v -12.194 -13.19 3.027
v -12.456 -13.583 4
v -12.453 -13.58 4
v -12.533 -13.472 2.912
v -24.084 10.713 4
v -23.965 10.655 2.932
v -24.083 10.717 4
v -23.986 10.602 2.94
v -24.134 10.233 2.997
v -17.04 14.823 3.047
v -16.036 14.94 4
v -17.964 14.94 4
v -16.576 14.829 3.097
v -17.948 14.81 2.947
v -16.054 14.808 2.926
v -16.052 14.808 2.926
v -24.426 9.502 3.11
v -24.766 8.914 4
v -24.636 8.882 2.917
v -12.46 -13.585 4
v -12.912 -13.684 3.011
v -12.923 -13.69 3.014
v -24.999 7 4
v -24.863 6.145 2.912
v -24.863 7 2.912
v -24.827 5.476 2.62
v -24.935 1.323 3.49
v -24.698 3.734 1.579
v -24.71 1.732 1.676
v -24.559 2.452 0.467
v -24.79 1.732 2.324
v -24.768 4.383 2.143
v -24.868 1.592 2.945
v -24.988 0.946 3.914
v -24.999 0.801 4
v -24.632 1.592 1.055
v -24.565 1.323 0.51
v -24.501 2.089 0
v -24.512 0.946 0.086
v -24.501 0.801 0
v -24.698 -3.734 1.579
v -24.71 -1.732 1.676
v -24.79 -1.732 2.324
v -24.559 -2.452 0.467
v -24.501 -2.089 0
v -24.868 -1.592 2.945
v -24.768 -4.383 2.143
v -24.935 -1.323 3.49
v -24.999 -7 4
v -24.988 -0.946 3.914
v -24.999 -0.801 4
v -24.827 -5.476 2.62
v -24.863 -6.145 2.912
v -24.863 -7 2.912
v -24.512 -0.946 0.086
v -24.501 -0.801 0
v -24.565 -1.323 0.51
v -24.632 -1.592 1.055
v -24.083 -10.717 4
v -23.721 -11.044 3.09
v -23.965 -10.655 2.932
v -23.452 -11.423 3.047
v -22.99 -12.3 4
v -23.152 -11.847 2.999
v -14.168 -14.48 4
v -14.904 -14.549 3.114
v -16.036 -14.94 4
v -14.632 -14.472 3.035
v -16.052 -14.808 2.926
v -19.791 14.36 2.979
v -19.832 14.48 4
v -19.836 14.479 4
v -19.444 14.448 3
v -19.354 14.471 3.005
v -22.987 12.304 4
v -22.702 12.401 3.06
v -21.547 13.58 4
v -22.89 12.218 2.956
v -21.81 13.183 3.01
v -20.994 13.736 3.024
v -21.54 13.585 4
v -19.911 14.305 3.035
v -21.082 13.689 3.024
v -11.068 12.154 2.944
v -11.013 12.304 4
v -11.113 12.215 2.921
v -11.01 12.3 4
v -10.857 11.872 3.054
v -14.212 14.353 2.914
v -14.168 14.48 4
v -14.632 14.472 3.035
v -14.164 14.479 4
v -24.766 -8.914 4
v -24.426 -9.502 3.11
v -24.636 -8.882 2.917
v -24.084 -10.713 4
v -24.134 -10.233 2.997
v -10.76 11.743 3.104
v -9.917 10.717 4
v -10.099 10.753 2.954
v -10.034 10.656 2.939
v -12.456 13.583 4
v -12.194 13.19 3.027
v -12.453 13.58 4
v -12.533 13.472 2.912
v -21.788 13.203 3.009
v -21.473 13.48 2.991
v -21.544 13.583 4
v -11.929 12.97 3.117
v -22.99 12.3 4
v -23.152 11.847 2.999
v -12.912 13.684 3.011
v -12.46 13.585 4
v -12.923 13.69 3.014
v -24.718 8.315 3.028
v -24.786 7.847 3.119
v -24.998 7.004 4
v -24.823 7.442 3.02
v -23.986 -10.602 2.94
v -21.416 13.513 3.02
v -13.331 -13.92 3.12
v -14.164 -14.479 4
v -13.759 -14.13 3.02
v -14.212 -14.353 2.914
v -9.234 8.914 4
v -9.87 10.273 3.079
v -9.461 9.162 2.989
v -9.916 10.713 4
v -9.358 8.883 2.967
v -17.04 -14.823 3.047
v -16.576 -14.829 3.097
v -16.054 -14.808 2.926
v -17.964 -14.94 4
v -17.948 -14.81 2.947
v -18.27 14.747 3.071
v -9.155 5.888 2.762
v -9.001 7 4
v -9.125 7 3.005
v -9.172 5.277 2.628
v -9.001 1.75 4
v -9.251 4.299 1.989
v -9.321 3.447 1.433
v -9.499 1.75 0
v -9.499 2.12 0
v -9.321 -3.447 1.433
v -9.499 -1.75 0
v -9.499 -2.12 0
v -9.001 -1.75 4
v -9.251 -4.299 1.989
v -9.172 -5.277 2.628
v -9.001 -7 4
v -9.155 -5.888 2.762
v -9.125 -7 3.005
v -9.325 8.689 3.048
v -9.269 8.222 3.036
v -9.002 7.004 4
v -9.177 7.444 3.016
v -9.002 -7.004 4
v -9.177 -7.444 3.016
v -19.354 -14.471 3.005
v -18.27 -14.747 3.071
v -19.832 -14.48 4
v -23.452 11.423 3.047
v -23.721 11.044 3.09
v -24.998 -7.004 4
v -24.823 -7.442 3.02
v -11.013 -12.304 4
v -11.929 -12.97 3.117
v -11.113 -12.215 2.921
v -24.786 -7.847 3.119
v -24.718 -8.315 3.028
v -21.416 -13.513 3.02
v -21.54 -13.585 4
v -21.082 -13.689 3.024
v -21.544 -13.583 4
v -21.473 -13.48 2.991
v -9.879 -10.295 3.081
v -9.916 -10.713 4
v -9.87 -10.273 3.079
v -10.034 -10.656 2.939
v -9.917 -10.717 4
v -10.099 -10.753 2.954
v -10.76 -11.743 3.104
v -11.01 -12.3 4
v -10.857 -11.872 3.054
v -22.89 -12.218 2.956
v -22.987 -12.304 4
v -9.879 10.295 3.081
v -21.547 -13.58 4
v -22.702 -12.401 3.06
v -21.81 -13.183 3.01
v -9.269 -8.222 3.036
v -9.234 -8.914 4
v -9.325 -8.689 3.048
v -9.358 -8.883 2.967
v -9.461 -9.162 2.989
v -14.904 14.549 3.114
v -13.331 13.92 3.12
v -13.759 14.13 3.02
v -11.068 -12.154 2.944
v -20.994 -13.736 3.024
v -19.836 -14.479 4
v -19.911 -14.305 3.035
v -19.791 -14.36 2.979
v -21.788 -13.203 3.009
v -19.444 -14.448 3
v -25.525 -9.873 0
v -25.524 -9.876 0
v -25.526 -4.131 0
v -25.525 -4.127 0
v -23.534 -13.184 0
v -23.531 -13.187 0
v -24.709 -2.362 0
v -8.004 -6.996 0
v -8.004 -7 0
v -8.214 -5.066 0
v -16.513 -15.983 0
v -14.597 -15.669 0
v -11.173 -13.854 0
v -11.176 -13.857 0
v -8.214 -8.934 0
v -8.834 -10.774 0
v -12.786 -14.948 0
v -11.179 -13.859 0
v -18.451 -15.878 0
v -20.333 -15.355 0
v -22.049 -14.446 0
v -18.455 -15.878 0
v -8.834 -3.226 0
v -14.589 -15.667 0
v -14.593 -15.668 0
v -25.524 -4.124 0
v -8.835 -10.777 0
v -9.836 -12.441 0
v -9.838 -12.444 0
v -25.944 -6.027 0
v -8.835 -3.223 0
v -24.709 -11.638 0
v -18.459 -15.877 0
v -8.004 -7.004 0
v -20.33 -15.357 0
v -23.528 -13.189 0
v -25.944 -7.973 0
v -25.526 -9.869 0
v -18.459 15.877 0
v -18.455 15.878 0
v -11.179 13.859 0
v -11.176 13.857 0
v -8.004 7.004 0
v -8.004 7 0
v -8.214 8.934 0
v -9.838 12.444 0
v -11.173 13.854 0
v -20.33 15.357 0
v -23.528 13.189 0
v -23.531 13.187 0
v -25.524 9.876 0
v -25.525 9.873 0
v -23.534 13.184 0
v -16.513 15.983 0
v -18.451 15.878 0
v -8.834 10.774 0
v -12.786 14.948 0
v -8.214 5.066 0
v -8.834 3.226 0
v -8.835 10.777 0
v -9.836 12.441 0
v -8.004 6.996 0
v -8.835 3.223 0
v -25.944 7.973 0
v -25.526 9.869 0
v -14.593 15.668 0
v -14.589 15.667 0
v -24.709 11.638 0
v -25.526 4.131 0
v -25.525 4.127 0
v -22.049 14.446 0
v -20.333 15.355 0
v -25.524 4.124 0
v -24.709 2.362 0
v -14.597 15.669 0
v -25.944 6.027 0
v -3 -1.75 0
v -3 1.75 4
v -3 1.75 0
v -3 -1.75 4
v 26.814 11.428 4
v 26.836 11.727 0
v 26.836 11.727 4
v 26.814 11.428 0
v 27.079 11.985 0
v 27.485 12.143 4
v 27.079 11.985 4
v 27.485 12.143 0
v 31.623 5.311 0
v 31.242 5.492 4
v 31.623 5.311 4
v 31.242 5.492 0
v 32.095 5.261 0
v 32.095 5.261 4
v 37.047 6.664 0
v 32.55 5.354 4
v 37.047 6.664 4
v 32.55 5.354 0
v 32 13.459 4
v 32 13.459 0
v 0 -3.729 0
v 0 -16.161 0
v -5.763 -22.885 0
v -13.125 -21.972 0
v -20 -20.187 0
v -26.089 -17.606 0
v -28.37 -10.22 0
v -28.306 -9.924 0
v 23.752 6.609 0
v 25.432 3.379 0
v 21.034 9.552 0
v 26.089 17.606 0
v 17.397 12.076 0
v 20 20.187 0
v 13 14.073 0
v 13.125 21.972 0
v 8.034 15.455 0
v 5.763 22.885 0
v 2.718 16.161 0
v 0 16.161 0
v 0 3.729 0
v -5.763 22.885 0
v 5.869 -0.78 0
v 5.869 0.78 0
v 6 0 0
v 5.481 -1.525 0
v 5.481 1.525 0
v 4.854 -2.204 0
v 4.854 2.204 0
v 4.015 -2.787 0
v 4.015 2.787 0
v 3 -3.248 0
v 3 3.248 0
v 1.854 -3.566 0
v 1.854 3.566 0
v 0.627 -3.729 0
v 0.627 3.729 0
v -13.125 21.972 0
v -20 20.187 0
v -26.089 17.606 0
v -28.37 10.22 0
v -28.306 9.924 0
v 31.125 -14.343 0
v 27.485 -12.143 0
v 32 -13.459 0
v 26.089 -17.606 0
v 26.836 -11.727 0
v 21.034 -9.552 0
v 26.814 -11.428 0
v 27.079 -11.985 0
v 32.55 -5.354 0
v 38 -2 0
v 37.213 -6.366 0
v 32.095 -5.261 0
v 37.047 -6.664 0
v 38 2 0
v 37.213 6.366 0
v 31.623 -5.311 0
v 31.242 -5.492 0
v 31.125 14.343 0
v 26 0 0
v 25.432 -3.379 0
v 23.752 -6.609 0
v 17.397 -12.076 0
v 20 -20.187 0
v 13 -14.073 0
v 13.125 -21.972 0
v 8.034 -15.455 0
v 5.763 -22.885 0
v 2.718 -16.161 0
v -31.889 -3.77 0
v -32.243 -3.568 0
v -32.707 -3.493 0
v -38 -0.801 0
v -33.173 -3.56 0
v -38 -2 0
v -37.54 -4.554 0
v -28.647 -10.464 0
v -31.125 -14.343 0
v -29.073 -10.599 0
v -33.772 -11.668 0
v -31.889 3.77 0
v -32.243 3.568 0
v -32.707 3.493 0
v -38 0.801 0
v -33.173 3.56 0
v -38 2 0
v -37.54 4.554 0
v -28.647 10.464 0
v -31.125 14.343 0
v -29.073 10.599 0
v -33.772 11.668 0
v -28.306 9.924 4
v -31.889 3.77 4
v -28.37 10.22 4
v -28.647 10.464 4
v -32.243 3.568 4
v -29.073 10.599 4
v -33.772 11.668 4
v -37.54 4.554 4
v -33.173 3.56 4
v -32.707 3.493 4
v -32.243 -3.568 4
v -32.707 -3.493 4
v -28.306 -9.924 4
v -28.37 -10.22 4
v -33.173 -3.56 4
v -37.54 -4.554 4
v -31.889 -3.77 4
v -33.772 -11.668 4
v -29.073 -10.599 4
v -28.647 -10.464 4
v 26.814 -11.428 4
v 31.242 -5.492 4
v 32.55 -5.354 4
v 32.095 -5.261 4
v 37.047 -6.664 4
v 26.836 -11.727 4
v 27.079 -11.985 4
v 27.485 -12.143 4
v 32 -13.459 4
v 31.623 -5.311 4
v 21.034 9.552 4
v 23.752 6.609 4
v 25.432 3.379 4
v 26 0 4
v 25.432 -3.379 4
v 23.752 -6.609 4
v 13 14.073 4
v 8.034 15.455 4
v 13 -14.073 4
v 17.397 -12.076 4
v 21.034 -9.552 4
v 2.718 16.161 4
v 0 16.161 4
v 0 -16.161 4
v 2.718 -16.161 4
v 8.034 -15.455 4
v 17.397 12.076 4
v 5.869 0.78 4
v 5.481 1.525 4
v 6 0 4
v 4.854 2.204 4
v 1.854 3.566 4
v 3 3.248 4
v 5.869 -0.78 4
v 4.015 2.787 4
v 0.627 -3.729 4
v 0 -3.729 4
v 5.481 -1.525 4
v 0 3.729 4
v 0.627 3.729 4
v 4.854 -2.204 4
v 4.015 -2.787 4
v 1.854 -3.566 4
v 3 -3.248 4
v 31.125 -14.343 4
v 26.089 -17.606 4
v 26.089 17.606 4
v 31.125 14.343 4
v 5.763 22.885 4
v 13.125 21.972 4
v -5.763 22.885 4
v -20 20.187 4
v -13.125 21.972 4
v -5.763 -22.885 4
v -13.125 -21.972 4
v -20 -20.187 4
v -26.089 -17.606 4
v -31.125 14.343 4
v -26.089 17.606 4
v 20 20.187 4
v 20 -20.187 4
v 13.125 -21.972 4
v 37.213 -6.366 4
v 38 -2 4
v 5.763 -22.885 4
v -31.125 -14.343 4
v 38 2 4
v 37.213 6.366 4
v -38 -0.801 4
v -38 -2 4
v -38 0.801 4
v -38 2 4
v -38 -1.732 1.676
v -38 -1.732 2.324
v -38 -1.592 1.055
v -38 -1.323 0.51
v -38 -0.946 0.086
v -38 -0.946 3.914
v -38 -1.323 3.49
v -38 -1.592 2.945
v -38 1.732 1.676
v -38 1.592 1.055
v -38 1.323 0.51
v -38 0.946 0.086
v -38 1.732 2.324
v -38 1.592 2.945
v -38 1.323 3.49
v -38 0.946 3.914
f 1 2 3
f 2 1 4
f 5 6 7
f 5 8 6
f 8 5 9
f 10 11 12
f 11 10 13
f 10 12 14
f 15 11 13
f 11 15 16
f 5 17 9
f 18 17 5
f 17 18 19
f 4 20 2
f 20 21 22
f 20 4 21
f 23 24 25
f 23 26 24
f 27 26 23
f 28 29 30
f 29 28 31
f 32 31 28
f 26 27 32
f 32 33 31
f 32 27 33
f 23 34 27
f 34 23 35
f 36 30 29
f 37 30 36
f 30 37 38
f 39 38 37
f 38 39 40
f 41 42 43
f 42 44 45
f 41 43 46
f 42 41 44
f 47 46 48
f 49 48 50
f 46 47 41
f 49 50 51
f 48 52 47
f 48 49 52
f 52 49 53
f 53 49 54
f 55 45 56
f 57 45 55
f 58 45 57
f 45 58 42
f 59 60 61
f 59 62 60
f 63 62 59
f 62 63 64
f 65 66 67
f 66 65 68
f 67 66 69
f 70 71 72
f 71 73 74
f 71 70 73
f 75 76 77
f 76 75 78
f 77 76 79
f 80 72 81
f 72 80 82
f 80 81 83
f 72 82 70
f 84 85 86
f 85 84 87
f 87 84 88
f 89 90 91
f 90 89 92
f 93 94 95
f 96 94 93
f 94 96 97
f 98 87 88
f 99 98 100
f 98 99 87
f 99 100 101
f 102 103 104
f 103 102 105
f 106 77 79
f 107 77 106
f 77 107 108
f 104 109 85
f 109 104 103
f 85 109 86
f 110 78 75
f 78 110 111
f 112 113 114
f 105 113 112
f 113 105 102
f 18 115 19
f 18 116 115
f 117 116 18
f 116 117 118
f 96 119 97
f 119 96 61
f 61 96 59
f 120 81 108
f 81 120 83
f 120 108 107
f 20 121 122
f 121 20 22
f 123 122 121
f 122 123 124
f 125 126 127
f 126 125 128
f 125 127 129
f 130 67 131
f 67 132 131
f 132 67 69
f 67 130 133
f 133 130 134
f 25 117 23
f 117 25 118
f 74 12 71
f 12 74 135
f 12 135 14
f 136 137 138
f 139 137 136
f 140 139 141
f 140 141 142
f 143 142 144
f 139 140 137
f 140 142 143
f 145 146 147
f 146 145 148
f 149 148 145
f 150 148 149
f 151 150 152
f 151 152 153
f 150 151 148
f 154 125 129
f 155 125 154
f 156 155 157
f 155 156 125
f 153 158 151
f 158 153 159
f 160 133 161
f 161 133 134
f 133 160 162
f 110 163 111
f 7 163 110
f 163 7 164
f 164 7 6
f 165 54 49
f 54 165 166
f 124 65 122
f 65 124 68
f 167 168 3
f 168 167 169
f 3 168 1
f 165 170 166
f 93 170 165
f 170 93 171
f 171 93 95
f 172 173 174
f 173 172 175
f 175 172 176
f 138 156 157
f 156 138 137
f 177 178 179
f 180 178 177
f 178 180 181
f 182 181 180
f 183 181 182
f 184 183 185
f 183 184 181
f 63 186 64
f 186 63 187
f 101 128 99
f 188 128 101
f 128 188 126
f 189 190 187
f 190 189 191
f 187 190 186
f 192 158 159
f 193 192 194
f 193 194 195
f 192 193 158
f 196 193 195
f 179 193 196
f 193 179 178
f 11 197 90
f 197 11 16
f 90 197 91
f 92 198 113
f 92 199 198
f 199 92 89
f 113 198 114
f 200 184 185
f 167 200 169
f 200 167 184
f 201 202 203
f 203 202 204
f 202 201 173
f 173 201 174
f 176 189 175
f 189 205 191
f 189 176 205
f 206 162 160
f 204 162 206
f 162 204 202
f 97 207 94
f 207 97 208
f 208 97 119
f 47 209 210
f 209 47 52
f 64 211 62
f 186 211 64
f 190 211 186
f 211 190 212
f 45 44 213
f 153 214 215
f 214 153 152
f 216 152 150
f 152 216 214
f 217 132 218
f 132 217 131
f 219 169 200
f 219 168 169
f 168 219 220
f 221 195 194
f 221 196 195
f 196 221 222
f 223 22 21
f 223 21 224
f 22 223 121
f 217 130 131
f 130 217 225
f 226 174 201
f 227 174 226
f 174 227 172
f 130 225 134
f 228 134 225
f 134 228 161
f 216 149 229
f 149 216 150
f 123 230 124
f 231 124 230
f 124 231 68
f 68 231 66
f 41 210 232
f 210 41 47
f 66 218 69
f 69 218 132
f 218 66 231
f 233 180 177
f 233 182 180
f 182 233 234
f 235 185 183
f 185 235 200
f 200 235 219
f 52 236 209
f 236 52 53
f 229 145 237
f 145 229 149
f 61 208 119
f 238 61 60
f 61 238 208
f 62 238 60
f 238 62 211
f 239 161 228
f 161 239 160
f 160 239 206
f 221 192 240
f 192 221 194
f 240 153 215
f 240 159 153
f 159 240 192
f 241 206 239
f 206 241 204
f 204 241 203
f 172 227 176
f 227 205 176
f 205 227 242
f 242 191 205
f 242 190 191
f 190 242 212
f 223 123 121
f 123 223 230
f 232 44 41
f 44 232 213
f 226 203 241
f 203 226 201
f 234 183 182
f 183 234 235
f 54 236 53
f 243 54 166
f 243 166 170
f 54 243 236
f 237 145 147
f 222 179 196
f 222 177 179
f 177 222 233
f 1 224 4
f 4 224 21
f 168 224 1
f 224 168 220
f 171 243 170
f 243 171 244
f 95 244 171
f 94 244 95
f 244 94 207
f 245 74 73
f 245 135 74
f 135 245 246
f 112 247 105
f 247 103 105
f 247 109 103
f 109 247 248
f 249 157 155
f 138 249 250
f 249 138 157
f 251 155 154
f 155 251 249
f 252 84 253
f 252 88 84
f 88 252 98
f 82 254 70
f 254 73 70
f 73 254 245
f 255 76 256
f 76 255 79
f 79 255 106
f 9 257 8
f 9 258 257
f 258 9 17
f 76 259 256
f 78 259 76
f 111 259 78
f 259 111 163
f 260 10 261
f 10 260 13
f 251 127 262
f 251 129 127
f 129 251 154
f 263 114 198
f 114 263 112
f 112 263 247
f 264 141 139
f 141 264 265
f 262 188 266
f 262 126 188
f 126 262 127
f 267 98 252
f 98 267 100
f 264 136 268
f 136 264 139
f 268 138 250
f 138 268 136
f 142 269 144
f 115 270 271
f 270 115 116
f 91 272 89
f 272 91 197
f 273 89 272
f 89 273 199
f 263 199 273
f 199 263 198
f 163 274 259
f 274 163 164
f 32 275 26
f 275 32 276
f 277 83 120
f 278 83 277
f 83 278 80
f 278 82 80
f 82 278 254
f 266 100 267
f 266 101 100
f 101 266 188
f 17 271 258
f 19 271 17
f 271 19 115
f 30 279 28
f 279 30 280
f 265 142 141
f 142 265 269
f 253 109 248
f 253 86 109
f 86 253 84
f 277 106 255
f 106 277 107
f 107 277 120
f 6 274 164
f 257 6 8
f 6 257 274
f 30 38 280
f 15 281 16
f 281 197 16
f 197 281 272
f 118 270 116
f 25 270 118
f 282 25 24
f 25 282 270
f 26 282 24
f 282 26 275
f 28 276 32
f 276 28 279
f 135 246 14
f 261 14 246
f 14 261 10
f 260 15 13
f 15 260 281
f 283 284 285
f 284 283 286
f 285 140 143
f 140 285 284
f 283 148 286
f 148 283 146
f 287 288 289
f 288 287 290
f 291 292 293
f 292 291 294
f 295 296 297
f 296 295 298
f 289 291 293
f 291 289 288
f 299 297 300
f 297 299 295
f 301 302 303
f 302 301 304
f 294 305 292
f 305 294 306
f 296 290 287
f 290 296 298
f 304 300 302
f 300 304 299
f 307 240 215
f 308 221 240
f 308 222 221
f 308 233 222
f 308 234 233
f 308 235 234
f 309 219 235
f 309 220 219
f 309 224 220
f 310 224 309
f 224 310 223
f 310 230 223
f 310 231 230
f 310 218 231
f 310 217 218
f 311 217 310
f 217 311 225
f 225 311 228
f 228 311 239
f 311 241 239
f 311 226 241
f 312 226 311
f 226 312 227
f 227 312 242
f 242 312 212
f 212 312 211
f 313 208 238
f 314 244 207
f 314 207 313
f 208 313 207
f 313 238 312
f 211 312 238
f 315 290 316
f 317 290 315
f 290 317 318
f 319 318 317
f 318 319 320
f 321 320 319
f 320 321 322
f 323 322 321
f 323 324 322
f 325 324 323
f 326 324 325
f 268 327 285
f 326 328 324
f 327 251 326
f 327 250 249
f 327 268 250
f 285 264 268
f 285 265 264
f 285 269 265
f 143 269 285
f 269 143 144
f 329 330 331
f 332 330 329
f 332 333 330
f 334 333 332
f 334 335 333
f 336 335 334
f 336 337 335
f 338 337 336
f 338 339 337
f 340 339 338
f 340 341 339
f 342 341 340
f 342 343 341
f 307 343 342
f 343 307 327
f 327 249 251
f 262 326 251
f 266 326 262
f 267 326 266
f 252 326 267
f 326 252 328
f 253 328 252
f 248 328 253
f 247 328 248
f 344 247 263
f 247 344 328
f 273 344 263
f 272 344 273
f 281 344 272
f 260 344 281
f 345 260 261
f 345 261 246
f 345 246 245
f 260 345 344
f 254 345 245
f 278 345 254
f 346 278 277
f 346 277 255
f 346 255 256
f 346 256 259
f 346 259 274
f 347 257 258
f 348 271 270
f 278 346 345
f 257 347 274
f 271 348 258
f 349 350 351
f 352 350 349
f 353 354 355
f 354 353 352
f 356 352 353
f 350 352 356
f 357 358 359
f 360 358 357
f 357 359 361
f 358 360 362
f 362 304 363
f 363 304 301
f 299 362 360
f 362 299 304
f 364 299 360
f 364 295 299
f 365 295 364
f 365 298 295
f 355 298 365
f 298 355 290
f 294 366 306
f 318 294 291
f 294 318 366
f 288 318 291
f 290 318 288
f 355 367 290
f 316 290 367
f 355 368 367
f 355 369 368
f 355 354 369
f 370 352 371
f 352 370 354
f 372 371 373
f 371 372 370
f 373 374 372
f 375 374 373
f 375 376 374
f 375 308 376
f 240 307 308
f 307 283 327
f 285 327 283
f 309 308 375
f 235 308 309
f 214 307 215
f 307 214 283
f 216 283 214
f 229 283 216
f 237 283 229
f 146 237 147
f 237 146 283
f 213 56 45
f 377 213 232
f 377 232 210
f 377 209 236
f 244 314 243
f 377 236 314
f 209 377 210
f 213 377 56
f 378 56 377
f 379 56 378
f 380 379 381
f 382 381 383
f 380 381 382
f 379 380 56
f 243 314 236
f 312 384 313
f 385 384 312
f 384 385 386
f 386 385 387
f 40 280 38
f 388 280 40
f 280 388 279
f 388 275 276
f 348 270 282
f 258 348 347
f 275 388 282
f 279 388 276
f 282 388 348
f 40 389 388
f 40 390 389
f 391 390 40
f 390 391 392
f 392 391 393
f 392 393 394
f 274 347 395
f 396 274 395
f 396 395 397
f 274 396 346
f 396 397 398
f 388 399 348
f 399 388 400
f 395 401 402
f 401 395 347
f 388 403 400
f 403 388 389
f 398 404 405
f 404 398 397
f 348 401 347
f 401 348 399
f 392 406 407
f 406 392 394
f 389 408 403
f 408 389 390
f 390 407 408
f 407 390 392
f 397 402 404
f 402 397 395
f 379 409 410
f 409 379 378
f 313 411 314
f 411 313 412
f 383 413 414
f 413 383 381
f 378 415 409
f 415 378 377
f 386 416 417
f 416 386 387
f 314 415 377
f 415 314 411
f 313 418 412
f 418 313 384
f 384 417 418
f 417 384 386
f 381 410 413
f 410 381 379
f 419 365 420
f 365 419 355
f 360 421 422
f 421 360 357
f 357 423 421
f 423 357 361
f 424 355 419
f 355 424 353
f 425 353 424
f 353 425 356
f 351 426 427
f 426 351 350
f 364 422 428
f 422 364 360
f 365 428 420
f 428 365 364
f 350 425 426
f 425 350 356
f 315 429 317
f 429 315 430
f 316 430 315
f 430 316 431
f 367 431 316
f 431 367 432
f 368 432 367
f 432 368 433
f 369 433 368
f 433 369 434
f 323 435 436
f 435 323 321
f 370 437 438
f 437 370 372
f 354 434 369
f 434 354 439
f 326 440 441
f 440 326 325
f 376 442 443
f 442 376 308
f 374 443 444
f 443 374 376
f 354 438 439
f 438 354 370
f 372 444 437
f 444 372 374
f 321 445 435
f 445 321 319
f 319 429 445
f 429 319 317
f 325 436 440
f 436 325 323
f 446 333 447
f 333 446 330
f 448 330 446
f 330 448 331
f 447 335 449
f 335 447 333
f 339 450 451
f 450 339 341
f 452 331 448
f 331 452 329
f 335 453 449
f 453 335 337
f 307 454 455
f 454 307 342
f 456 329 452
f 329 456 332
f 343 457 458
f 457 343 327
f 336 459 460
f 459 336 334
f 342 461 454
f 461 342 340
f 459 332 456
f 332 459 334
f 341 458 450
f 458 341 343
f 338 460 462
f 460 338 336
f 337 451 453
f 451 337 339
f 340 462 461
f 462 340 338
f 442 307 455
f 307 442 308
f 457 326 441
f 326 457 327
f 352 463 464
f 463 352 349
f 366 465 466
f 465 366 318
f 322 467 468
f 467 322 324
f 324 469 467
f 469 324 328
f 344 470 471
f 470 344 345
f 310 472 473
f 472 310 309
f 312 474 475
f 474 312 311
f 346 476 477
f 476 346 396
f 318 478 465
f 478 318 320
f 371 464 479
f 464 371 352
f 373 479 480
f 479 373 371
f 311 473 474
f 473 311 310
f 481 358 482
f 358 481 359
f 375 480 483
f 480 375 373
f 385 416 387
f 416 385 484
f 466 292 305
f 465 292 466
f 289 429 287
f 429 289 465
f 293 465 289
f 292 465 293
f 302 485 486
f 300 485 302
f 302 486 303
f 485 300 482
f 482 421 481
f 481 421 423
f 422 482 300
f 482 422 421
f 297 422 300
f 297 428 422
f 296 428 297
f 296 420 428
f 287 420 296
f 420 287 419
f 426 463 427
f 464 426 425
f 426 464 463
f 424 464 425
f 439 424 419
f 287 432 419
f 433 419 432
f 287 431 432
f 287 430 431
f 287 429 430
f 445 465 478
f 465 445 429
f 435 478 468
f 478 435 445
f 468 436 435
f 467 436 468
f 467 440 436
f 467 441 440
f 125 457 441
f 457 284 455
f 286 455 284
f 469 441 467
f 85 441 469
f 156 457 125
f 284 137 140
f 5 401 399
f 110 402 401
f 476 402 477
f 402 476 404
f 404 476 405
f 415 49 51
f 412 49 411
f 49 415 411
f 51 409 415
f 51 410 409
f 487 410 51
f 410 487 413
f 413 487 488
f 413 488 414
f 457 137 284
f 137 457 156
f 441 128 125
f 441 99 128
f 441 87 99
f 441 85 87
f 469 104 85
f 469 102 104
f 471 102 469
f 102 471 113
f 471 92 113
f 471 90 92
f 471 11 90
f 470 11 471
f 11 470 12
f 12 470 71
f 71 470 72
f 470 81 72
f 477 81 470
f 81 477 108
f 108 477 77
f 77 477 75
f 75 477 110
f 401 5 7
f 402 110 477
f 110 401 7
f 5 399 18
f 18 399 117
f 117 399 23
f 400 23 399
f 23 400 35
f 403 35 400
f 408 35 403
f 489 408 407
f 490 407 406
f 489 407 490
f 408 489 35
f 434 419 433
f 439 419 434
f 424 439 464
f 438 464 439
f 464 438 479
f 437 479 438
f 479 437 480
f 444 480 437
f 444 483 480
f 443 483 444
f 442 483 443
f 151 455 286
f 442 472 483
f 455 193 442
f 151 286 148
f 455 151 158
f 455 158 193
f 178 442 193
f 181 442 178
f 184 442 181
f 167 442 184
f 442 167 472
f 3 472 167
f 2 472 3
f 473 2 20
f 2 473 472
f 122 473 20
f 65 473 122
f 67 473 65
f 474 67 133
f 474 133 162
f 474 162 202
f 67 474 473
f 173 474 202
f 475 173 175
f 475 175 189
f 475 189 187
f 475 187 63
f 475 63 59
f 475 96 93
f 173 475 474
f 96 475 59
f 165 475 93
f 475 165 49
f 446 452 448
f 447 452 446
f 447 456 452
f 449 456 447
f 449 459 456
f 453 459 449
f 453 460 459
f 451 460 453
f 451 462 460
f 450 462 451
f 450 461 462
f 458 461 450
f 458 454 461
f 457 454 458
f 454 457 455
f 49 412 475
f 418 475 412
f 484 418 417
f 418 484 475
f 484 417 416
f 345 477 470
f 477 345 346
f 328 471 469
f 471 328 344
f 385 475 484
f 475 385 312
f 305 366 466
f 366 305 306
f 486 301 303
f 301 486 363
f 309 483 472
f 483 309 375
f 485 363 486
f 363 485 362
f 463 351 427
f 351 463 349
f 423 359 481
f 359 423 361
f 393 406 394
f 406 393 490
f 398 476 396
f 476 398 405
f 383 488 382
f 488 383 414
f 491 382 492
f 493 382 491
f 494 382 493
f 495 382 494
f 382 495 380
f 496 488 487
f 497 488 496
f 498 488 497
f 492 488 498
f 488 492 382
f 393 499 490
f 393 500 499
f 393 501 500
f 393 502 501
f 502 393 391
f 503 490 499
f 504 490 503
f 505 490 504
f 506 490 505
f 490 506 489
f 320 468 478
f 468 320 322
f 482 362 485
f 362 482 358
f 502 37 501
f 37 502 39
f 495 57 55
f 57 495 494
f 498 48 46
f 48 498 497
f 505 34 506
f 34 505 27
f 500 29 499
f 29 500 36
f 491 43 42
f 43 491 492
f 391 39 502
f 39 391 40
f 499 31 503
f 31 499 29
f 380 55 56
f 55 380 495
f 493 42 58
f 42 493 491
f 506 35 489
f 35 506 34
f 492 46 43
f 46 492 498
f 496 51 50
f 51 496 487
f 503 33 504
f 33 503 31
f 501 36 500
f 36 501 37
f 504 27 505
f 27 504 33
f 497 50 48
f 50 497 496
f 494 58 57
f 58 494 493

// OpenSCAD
//a Globals
// First model has pegs, which we need to remove
// The side notches are also unnecessary
// The eye holes are slightly too big even for the apple earbuds
// The bottom notches could be slightly deeper (not absolutely necessary, 1mm poss)
//
// Second model works very well with the Apple ishuffle earbuds

//a Modules
module ear_bud( base_d, ear_d, depth )
{
  cylinder( h=depth*0.9, r1=base_d/2, r2=ear_d/2 );
  translate([0,0,depth*0.9]) cylinder( h=depth*0.1, r=ear_d/2 );
}

module ear_bud_with_wire( bud, wire )
{
  // bud is [ base diameter, ear diameter, height ]
  // wire is [ body diameter, body length ]
  translate([0,0,-wire[0]/2]) ear_bud( depth=bud[2], base_d=bud[0], ear_d=bud[1] );
  rotate([0,90,0])            cylinder( h=wire[1], r=wire[0]/2, $fs=0.5 );
}

module headphone_35mm_plug_straight( body, strain_relief )
{
  rotate([0,90,0])                             cylinder( h=0.5, r1=2.6/2, r2=3.5/2, $fs=0.5 );
  translate([0.5,0,0])        rotate([0,90,0]) cylinder( h=3.0, r2=2.6/2, r1=3.5/2, $fs=0.5 );
  translate([3.5,0,0])        rotate([0,90,0]) cylinder( h=3.5, r=3.0/2, $fs=0.5 );
  translate([7,0,0])          rotate([0,90,0]) cylinder( h=3.5, r=3.2/2, $fs=0.5 );
  translate([10.5,0,0])       rotate([0,90,0]) cylinder( h=3.5, r=3.5/2, $fs=0.5 );
  translate([14,0,0])         rotate([0,90,0]) cylinder( h=body[1], r=body[0]/2, $fs=0.5 );
  translate([14+body[1],0,0]) rotate([0,90,0]) cylinder( h=strain_relief[1], r=strain_relief[0]/2, $fs=0.5 );
}

// apple shuffle headphones
//ear_bud_with_wire( bud=[5,16,12], wire=[5,26] );
//translate([0,10,0]) headphone_35mm_plug_straight( body=[5,12], strain_relief=[3.5,5] );

// ear_bud_with_wire( bud=[5,16,12], wire=[5,26] );
// translate([0,10,0]) headphone_35mm_plug_straight( body=[5,12], strain_relief=[3.5,5] );

ear_bud       = [5,16,12];
ear_bud_wire  = [5,26];
plug_body     = [5,12];
plug_strain_relief = [3.5,5];
plug = [ plug_body, plug_strain_relief ];
wire_radius = 9;

module cable_wrap_headphone_plug_hole(length)
{
  scale([1,1,1.3]) rotate([0,90,0]) cylinder( h=length, r=3.5/2, $fs=0.5 );
}

module cable_wrap_earphone_hole(length, width, height, ear_bud, plug, countersink )
{
  plug_room = plug[0][0]*1;
  ear_plug_r0 = ear_bud[1]/2;
  ear_plug_r1 = ear_bud[1]/2+0.5-1*countersink;
  ear_plug_r2 = ear_bud[1]/2+1.0;
  ear_plug_offset = ear_plug_r2/2 + plug_room/2;
  translate( [-length+14+ear_plug_r2,0,0] )      
    {
      union()
      {
	hull()
	  {
	    translate([0,-ear_plug_offset,0]) cylinder( h=height, r2=ear_plug_r0, r1=ear_plug_r1 );
	    translate([0,+ear_plug_offset,0]) cylinder( h=height, r2=ear_plug_r0, r1=ear_plug_r1 );
	  }
	translate([0,-ear_plug_offset,0]) cylinder( h=height, r2=ear_plug_r1, r1=ear_plug_r2 );
	translate([0,+ear_plug_offset,0]) cylinder( h=height, r2=ear_plug_r1, r1=ear_plug_r2 );
	translate([0,-plug[1][0]/2,0]) cube( [plug[1][1]+wire_radius,plug[1][0],height] );
      }
    }
}

module cable_wrap_body( length, width, height, ear_bud=ear_bud, plug=plug )
{
  space=4;
  scale([1,1,1/2]) minkowski()
    {
      translate([-space/2,-space/2]) cube([space,space,height]);
      hull()
      {
        cable_wrap_earphone_hole( length=length, width=width, height=height, ear_bud=ear_bud, plug=plug, countersink=0 );
        scale([1,(width-space)/(length-space),1]) cylinder( r=length-space, h=height );
      }
    }
}

//	  translate( [-(length-space-ear_bud[1]/2),0,0] ) cylinder( h=height, r=ear_bud[1]/2 );
//	  translate( [length-space-ear_bud[1]/2,0,0] ) cylinder( h=height, r=ear_bud[1]/2 );
//	  translate( [length-space*2-ear_bud[1]/2,width-20,0] ) cylinder( h=height, r=ear_bud[1]/2 );
//	  translate( [length-space*2-ear_bud[1]/2,-width+20,0] ) cylinder( h=height, r=ear_bud[1]/2 );
//	  translate( [0,width-space-ear_bud[1]/2,0] )    cylinder( h=height, r=ear_bud[1]/2 );
//	  translate( [0,-(width-space-ear_bud[1]/2),0] ) cylinder( h=height, r=ear_bud[1]/2 );

module cable_wrap_notch( length, width, height, angle, notch )
{
  scale([1,width/length,1])
    {
      rotate([0,0,angle])
	translate( [length-notch[0],-notch[1]/2,0] )
	scale([1,1,1/2]) minkowski()
	{
	  cylinder(r=1,h=height, $fs=0.5);
	  cube( [notch[0]*2,notch[1],height] );
	}
    }
}

module cable_wrap_tie_off( length, width, height, scales )
{
  intersection()
    {
      difference()
	{
	  scale( [scales[0],scales[0]*width/length,1] ) { cylinder( r=length, h=height ); }
	  scale( [scales[1],scales[1]*width/length,1.1] ) { cylinder( r=length, h=height ); }
	}
      translate([0,-width,-height]) cube([length,width*2,height*3]);
    }
}

module cable_wrap_peg( peg )
{
  translate([peg[0]/2,0,0]) cylinder( r=peg[0]/2, h=peg[1], $fs=0.1 );
}

module cable_wrap_peg_range_recurse( peg, peg_separations, index )
{
  cable_wrap_peg( peg );
  if (index<len(peg_separations))
    {
      translate([peg[0]+peg_separations[index],0,0]) cable_wrap_peg_range_recurse( peg, peg_separations, index+1 );
    }
}

function vec_sum(v,index=0) = (index>=len(v)) ? 0 : (v[index]+vec_sum(v,index+1));

module cable_wrap_peg_range( peg, peg_separations, angle, length, width, scale=1.0 )
{
  rscale = scale;
  peg_range_width = vec_sum(peg_separations) + peg[0]*(len(peg_separations)+1);
  translate([length*cos(angle)*rscale,width*sin(angle)*rscale,0])
    rotate([0,0,angle])
    rotate([0,0,90])
    translate([-peg_range_width/2,0,0])
    cable_wrap_peg_range_recurse( peg, peg_separations, 0 );
}

module cable_wrap( length, width, height, ear_bud, plug, notch )
{
  lw = sqrt(length*width);
  union()
  {
    // length is x, width is y
    difference() {
      cable_wrap_body( length=length, width=width, height=height, ear_bud=ear_bud, plug=plug );
      translate( [-length-1/2,0,height/2] )                 cable_wrap_headphone_plug_hole(length=18);
      translate( [0,0,-0.01] )                              cable_wrap_earphone_hole( length=length, width=width, height=height+0.02, ear_bud=ear_bud, plug=plug, countersink=1 );
      //      for (i=[25,70,160,-160,-70,-25])
      for (i=[25,160,-160,-25])
	{
	  cable_wrap_notch( length=length, width=width, height=height+0.02, notch=notch, angle=i );
	}
      translate([0,0,-0.01]) cable_wrap_tie_off( length=length, width=width, height=height*2, scales=tie_off_scales );
    }
    translate([0,0,height-0.01])
      {
	for (i=[5:7])
	  {
	    //cable_wrap_peg_range( peg=peg, peg_separations=peg_separations, length=length, width=width, angle=-25, scale=i*0.1 );
	    //cable_wrap_peg_range( peg=peg, peg_separations=peg_separations, length=length, width=width, angle=25, scale=i*0.1 );
	  }
      }
  }
}

length=40;
width=25;
height=4;
notch = [7,10];
peg = [1.3,1.5];
peg_separations = [1.0,1.9,1.0];
tie_off_scales = [0.4,0.2];
tie_off_scales = [0.65,0.15];

cable_wrap( length=length, width=width, height=height, ear_bud=ear_bud, plug=plug, notch=notch );

//translate([-length+2,0,height/2]) headphone_35mm_plug_straight( body=plug[0], strain_relief=plug[1] );
//translate([-length+15+(ear_bud[1]+3*ear_bud[0])*3/8, plug[0][0]*1/2+ear_bud[1]/2,height+ear_bud_wire[0]/2]) rotate([180,0,-30]) ear_bud_with_wire( ear_bud, ear_bud_wire );
//translate([-length+15+(ear_bud[1]+3*ear_bud[0])*3/8,-plug[0][0]*1/2-ear_bud[1]/2,height+ear_bud_wire[0]/2]) rotate([180,0,  5]) ear_bud_with_wire( ear_bud, ear_bud_wire );


// Note that a peg of smaller than 1.3mm is not reliably printed on standard slic3r settings
// Hence peg [1.3,1.5] was chosen for our pegs. Before we removed them.
//length=10;
//width=20;
//union()
//{
//    translate([-8,-30,0]) cube([16,30,1]);
//    translate([0,0,0.99]) for (i=[1:14])
//    {
//        cable_wrap_peg_range( peg=[0.5+i*0.1,1.2], peg_separations=peg_separations, length=length, width=width, angle=-90, scale=i*0.1 );
//    }
//}
